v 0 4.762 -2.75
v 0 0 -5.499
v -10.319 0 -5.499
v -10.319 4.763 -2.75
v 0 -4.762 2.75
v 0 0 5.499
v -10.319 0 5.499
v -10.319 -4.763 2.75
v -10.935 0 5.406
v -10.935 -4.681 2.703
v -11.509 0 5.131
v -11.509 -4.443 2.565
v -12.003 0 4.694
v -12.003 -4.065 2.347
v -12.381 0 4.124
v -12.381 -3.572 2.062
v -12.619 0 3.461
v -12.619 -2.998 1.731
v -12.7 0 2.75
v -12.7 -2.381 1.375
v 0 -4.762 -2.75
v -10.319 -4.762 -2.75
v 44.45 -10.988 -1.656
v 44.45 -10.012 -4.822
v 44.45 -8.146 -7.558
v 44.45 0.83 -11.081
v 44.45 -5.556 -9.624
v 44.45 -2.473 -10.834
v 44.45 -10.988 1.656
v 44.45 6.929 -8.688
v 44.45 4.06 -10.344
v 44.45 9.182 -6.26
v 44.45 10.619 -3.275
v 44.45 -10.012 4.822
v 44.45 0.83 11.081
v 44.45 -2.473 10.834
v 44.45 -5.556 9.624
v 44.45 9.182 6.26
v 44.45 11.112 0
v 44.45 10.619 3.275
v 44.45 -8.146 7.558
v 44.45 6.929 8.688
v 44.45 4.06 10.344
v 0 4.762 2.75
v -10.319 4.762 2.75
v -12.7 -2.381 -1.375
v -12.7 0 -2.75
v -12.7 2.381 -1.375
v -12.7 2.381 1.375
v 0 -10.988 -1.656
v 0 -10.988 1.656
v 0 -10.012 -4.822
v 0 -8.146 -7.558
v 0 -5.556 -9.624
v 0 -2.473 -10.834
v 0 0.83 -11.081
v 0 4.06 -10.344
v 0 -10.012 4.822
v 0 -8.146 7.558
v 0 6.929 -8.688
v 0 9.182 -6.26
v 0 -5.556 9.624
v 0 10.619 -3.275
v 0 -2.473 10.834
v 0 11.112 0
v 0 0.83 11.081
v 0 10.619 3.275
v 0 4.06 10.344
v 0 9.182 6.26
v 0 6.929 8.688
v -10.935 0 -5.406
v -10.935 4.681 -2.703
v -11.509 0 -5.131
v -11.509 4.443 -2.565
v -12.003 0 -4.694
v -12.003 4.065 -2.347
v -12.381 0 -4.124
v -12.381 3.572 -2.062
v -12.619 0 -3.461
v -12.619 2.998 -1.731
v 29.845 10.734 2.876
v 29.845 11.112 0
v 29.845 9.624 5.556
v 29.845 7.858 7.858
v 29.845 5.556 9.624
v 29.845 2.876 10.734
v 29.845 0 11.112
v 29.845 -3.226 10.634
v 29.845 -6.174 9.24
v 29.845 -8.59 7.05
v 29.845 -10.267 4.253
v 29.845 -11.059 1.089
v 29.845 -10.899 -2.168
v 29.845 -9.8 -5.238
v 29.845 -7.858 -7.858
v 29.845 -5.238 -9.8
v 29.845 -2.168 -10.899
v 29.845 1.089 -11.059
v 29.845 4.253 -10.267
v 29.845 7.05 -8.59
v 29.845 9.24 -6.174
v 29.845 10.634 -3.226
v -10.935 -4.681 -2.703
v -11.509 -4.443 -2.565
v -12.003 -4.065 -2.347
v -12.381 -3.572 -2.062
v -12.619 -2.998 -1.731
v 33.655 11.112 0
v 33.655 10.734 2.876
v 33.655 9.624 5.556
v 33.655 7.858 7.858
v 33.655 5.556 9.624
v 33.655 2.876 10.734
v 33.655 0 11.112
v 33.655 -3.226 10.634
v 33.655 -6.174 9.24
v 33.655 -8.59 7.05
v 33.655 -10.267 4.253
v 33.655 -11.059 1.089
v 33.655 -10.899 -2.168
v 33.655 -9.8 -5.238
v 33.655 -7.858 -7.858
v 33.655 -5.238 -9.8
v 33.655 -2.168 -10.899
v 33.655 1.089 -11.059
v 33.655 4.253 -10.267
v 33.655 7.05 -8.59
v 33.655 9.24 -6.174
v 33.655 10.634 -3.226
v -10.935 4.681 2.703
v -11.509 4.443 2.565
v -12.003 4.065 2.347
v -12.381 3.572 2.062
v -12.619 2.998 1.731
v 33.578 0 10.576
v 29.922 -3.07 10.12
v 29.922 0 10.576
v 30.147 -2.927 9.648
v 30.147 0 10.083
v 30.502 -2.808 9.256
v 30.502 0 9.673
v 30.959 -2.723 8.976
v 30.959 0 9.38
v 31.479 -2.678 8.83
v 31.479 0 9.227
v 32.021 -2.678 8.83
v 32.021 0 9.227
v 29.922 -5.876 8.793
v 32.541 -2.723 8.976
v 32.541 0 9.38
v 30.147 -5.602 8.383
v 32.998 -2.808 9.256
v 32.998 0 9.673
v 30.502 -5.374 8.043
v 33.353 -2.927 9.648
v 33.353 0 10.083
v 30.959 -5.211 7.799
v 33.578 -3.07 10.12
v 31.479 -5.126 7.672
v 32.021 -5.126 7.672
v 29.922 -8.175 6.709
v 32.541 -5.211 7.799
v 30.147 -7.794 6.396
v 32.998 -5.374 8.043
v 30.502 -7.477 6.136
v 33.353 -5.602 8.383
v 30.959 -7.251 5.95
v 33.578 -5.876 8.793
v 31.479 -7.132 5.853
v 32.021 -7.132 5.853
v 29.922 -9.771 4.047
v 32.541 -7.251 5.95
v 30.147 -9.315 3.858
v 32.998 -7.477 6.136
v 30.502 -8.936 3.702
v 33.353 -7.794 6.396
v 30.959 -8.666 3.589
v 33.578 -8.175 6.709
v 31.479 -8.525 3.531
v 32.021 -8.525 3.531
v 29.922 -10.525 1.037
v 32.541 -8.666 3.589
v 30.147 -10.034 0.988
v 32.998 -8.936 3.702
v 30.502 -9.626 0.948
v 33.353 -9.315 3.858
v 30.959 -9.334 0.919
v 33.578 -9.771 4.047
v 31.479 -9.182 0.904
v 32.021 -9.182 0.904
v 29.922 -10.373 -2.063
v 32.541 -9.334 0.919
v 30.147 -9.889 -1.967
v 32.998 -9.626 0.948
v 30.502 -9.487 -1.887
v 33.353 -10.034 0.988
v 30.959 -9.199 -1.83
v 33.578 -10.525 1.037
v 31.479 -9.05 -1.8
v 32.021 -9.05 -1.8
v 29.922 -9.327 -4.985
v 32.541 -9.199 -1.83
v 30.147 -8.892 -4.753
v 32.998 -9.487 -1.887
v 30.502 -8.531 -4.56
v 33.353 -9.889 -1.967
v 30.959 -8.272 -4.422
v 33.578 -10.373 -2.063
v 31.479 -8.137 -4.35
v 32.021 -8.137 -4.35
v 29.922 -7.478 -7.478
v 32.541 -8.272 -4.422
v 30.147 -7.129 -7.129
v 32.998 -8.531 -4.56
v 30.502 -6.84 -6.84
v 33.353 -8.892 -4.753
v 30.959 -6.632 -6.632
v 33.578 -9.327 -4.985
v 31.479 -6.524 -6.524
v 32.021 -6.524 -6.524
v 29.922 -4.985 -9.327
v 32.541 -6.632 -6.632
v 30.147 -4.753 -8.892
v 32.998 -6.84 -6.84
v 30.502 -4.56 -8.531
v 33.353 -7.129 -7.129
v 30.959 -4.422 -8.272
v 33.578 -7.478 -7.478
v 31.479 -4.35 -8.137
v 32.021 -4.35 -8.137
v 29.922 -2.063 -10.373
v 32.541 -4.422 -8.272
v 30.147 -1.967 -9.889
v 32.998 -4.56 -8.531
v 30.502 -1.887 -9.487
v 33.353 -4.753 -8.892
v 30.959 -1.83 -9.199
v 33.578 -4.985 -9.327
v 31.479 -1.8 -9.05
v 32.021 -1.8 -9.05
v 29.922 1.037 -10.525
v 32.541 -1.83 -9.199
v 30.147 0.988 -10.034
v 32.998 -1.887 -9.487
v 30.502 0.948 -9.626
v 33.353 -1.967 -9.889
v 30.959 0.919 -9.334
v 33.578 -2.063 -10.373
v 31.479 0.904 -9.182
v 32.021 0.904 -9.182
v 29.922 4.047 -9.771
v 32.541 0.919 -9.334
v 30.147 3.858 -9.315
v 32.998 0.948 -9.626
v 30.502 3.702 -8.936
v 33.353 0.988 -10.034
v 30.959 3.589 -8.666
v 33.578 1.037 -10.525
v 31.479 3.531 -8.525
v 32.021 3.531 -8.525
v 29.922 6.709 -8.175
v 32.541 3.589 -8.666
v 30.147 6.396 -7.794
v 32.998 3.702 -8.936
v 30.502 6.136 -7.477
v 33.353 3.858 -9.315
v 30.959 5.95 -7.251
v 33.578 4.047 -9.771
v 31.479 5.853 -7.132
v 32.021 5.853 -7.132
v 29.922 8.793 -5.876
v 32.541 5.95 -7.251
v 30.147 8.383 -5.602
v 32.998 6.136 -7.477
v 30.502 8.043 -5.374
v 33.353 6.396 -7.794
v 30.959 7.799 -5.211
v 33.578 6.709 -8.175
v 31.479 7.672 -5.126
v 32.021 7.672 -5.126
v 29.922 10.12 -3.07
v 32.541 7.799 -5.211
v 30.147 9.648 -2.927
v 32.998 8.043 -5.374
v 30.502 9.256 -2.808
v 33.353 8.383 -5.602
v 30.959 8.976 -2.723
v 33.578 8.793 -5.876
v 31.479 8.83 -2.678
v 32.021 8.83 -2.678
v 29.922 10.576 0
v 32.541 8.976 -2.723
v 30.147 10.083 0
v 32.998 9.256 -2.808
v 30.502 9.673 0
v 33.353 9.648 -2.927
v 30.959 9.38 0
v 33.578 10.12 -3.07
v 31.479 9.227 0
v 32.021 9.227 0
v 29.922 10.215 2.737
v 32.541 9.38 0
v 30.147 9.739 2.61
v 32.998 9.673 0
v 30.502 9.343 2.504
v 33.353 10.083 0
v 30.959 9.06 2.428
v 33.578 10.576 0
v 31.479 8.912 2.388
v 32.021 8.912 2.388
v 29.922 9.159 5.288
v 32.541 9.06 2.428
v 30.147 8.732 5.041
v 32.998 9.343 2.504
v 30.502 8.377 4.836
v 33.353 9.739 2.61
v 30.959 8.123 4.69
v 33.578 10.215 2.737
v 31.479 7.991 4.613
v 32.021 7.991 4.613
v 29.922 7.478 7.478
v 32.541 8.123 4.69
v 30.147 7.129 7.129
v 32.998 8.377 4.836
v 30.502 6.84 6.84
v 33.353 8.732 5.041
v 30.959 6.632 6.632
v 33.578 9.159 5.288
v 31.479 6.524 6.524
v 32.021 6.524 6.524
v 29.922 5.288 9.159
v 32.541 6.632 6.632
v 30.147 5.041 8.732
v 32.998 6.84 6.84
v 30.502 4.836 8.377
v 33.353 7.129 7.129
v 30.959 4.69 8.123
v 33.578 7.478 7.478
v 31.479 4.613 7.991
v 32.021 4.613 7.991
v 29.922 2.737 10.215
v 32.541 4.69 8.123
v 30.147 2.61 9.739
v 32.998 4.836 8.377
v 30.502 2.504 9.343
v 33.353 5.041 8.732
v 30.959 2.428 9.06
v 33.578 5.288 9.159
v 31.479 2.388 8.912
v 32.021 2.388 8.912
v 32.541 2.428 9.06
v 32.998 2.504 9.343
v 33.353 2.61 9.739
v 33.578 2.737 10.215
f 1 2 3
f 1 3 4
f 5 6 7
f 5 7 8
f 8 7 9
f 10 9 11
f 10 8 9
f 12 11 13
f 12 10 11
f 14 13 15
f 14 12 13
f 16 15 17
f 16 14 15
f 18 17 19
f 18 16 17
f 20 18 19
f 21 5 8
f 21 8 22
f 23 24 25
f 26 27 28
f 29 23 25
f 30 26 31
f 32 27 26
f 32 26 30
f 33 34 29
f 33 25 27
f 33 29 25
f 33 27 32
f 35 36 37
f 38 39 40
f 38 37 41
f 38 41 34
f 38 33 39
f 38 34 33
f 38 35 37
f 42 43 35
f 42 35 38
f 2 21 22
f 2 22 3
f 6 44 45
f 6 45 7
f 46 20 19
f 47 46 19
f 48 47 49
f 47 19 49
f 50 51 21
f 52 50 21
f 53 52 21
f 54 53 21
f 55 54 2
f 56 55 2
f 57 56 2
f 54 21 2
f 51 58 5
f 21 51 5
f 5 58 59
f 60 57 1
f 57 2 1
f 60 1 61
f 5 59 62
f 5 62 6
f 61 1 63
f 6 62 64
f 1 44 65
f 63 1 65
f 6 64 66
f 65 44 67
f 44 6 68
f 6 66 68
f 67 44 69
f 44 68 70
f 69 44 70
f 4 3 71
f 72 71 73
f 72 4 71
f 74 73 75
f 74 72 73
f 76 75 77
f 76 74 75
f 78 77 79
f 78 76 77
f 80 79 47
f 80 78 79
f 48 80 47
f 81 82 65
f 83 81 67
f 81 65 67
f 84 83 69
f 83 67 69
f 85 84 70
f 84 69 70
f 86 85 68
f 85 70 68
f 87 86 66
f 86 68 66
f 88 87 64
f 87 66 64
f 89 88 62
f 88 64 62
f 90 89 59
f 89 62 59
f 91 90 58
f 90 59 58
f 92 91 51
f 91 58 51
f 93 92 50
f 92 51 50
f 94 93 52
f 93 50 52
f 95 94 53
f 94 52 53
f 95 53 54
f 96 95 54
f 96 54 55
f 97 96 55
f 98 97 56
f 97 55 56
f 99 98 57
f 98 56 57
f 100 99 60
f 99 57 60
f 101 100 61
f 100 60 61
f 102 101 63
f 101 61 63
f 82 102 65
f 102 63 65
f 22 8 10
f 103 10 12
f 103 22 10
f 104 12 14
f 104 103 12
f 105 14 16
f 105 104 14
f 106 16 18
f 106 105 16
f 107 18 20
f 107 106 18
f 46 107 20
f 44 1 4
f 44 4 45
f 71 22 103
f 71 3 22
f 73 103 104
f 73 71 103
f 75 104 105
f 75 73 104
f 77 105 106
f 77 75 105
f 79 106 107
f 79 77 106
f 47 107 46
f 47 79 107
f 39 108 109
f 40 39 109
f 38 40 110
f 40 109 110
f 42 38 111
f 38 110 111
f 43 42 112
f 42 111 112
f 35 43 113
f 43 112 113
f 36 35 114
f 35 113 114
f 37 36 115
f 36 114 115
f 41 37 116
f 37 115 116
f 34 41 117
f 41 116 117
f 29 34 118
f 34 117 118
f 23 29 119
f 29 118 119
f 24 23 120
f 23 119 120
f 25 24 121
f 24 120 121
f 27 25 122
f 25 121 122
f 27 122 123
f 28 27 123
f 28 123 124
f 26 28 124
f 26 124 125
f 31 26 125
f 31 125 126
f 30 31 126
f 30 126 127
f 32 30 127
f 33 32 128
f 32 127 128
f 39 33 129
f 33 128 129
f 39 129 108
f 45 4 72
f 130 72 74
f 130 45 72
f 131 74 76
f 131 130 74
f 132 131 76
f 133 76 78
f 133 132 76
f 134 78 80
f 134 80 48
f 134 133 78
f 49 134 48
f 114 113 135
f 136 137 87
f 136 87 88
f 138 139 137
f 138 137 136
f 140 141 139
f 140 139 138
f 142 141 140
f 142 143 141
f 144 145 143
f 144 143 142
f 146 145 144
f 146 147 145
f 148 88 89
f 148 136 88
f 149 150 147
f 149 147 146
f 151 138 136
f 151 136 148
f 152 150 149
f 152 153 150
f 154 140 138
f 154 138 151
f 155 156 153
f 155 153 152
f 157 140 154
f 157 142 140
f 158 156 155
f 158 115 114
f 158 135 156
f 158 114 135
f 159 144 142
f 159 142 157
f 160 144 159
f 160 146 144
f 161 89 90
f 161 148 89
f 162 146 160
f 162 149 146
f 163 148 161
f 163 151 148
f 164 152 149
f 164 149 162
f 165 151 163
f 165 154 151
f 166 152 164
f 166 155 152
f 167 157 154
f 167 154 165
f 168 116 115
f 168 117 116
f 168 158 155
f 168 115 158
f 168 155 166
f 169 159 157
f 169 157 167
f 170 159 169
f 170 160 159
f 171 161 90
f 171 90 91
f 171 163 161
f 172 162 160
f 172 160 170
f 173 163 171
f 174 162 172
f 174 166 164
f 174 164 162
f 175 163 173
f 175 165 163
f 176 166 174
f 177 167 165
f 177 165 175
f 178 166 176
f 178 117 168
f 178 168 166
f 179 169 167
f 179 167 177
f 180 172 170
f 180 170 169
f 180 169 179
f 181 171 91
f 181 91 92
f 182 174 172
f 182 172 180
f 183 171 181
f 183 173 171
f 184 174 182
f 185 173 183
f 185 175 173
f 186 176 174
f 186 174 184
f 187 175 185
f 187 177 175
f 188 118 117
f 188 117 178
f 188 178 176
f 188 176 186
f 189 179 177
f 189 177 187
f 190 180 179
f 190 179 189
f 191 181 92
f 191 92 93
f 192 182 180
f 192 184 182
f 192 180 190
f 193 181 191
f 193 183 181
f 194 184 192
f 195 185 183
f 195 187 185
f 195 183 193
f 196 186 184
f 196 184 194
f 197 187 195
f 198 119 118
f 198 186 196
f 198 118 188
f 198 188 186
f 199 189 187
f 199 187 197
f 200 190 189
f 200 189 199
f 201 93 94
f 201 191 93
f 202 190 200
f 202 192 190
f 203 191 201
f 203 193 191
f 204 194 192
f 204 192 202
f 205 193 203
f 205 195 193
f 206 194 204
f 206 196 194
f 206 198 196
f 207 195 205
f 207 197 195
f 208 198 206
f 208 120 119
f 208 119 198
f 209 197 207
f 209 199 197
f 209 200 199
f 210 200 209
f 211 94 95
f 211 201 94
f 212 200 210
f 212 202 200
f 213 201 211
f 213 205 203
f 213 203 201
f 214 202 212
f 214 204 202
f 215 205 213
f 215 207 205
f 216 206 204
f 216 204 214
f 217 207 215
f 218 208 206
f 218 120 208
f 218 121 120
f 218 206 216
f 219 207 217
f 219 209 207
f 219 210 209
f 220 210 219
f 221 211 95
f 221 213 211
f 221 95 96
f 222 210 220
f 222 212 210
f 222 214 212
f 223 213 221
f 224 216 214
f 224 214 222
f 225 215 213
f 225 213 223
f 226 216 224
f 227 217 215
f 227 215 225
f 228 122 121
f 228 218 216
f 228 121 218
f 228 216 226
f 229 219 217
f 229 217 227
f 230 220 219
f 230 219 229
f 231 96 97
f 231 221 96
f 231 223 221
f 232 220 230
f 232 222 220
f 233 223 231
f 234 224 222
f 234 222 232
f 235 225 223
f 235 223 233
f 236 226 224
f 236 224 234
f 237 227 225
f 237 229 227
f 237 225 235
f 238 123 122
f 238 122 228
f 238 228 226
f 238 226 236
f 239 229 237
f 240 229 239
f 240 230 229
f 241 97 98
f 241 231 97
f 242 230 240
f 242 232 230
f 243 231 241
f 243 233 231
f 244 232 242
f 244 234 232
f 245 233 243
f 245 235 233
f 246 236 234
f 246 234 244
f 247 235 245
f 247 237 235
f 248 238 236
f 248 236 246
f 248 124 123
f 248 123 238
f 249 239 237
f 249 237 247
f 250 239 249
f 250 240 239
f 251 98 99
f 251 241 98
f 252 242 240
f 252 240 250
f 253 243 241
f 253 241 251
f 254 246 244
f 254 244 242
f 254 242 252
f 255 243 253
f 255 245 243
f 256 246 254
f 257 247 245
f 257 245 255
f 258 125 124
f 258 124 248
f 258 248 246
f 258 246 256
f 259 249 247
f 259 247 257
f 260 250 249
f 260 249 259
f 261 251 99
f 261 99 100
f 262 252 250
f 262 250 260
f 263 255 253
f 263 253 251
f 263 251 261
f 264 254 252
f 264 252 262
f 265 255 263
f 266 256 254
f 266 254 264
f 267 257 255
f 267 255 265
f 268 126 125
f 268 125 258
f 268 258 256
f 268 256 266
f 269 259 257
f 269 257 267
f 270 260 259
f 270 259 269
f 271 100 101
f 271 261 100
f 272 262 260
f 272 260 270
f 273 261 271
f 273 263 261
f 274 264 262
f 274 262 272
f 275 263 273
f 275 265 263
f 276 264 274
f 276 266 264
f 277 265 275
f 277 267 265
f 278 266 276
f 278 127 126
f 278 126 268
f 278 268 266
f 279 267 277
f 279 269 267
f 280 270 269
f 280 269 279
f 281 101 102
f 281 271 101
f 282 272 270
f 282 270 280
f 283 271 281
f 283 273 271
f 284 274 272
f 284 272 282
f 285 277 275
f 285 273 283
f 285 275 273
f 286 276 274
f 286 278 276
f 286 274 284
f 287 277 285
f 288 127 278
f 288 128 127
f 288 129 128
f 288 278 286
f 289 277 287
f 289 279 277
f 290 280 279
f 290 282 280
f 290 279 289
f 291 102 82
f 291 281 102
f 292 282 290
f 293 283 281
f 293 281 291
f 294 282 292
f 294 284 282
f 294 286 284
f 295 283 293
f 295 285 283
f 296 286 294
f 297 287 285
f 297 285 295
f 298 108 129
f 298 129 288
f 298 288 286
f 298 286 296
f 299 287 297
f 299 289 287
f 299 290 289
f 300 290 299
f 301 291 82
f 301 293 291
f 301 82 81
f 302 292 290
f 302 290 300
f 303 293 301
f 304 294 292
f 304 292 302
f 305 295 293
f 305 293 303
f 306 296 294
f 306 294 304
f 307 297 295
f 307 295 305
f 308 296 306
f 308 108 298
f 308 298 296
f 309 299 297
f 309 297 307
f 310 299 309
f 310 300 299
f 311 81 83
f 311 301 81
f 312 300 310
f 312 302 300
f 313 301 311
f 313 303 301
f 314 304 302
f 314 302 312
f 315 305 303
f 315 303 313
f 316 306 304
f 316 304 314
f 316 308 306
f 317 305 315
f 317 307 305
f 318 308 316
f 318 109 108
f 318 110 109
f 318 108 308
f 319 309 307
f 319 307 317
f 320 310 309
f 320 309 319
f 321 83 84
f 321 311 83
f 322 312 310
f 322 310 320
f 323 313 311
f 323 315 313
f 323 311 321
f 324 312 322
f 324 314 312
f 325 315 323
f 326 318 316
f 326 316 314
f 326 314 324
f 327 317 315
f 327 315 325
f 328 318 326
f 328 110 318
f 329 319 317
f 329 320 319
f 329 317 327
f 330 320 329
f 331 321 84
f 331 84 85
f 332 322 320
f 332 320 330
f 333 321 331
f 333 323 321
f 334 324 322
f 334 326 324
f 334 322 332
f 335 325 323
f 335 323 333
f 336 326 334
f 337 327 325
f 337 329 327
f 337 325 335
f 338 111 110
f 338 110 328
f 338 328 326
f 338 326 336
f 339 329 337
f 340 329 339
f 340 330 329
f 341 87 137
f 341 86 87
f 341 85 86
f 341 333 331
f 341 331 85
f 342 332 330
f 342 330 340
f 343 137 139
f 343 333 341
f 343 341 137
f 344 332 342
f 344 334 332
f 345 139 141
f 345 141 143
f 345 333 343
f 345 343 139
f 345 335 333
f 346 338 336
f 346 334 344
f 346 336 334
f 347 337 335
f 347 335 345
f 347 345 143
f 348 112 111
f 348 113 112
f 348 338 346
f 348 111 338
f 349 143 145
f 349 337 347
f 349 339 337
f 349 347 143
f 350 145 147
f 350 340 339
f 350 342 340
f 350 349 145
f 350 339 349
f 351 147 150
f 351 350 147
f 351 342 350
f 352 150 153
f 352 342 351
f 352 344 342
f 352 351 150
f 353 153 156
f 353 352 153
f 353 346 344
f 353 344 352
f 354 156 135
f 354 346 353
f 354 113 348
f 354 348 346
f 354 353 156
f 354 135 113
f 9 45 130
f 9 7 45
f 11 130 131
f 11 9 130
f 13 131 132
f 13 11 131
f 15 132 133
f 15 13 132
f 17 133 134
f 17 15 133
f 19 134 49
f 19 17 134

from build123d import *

# Parameters (mm, degrees)
F0_R     = 11.1125
F1_DEPTH = 44.45
F3_DEPTH = 12.7
F4_R     = 2.38125
F6_R     = 1.905


with BuildPart() as f1:
    # F0 (on Right) → F1 (new body)
    with BuildSketch(Plane.YZ):
        Circle(F0_R)
    extrude(amount=F1_DEPTH)

    # F2 (on Right) → F3 (join)
    with BuildSketch(Plane.YZ):
        Polygon((-4.7625, 2.749631), (-4.7625, -2.749631), (0, -5.499261), (4.7625, -2.749631), (4.7625, 2.749631), (0, 5.499261), align=None)
    extrude(amount=-F3_DEPTH)

    # F4
    f4_edges = [f1.edges().sort_by_distance(p)[0] for p in [
        (-12.7, -2.38125, 4.124446),
        (-12.7, 2.38125, 4.124446),
        (-12.7, 4.7625, 0),
        (-12.7, 2.38125, -4.124446),
        (-12.7, -2.38125, -4.124446),
        (-12.7, -4.7625, 0),
    ]]
    fillet(f4_edges, radius=F4_R)

    # F6 (on Front) → F7 (revolve, cut)
    with BuildSketch(Plane.XZ):
        with Locations((31.75, 11.1125)):
            Circle(F6_R)
    revolve(axis=Axis((39.763745, 0, 0), (1, 0, 0)), mode=Mode.SUBTRACT)


solid = f1.part
